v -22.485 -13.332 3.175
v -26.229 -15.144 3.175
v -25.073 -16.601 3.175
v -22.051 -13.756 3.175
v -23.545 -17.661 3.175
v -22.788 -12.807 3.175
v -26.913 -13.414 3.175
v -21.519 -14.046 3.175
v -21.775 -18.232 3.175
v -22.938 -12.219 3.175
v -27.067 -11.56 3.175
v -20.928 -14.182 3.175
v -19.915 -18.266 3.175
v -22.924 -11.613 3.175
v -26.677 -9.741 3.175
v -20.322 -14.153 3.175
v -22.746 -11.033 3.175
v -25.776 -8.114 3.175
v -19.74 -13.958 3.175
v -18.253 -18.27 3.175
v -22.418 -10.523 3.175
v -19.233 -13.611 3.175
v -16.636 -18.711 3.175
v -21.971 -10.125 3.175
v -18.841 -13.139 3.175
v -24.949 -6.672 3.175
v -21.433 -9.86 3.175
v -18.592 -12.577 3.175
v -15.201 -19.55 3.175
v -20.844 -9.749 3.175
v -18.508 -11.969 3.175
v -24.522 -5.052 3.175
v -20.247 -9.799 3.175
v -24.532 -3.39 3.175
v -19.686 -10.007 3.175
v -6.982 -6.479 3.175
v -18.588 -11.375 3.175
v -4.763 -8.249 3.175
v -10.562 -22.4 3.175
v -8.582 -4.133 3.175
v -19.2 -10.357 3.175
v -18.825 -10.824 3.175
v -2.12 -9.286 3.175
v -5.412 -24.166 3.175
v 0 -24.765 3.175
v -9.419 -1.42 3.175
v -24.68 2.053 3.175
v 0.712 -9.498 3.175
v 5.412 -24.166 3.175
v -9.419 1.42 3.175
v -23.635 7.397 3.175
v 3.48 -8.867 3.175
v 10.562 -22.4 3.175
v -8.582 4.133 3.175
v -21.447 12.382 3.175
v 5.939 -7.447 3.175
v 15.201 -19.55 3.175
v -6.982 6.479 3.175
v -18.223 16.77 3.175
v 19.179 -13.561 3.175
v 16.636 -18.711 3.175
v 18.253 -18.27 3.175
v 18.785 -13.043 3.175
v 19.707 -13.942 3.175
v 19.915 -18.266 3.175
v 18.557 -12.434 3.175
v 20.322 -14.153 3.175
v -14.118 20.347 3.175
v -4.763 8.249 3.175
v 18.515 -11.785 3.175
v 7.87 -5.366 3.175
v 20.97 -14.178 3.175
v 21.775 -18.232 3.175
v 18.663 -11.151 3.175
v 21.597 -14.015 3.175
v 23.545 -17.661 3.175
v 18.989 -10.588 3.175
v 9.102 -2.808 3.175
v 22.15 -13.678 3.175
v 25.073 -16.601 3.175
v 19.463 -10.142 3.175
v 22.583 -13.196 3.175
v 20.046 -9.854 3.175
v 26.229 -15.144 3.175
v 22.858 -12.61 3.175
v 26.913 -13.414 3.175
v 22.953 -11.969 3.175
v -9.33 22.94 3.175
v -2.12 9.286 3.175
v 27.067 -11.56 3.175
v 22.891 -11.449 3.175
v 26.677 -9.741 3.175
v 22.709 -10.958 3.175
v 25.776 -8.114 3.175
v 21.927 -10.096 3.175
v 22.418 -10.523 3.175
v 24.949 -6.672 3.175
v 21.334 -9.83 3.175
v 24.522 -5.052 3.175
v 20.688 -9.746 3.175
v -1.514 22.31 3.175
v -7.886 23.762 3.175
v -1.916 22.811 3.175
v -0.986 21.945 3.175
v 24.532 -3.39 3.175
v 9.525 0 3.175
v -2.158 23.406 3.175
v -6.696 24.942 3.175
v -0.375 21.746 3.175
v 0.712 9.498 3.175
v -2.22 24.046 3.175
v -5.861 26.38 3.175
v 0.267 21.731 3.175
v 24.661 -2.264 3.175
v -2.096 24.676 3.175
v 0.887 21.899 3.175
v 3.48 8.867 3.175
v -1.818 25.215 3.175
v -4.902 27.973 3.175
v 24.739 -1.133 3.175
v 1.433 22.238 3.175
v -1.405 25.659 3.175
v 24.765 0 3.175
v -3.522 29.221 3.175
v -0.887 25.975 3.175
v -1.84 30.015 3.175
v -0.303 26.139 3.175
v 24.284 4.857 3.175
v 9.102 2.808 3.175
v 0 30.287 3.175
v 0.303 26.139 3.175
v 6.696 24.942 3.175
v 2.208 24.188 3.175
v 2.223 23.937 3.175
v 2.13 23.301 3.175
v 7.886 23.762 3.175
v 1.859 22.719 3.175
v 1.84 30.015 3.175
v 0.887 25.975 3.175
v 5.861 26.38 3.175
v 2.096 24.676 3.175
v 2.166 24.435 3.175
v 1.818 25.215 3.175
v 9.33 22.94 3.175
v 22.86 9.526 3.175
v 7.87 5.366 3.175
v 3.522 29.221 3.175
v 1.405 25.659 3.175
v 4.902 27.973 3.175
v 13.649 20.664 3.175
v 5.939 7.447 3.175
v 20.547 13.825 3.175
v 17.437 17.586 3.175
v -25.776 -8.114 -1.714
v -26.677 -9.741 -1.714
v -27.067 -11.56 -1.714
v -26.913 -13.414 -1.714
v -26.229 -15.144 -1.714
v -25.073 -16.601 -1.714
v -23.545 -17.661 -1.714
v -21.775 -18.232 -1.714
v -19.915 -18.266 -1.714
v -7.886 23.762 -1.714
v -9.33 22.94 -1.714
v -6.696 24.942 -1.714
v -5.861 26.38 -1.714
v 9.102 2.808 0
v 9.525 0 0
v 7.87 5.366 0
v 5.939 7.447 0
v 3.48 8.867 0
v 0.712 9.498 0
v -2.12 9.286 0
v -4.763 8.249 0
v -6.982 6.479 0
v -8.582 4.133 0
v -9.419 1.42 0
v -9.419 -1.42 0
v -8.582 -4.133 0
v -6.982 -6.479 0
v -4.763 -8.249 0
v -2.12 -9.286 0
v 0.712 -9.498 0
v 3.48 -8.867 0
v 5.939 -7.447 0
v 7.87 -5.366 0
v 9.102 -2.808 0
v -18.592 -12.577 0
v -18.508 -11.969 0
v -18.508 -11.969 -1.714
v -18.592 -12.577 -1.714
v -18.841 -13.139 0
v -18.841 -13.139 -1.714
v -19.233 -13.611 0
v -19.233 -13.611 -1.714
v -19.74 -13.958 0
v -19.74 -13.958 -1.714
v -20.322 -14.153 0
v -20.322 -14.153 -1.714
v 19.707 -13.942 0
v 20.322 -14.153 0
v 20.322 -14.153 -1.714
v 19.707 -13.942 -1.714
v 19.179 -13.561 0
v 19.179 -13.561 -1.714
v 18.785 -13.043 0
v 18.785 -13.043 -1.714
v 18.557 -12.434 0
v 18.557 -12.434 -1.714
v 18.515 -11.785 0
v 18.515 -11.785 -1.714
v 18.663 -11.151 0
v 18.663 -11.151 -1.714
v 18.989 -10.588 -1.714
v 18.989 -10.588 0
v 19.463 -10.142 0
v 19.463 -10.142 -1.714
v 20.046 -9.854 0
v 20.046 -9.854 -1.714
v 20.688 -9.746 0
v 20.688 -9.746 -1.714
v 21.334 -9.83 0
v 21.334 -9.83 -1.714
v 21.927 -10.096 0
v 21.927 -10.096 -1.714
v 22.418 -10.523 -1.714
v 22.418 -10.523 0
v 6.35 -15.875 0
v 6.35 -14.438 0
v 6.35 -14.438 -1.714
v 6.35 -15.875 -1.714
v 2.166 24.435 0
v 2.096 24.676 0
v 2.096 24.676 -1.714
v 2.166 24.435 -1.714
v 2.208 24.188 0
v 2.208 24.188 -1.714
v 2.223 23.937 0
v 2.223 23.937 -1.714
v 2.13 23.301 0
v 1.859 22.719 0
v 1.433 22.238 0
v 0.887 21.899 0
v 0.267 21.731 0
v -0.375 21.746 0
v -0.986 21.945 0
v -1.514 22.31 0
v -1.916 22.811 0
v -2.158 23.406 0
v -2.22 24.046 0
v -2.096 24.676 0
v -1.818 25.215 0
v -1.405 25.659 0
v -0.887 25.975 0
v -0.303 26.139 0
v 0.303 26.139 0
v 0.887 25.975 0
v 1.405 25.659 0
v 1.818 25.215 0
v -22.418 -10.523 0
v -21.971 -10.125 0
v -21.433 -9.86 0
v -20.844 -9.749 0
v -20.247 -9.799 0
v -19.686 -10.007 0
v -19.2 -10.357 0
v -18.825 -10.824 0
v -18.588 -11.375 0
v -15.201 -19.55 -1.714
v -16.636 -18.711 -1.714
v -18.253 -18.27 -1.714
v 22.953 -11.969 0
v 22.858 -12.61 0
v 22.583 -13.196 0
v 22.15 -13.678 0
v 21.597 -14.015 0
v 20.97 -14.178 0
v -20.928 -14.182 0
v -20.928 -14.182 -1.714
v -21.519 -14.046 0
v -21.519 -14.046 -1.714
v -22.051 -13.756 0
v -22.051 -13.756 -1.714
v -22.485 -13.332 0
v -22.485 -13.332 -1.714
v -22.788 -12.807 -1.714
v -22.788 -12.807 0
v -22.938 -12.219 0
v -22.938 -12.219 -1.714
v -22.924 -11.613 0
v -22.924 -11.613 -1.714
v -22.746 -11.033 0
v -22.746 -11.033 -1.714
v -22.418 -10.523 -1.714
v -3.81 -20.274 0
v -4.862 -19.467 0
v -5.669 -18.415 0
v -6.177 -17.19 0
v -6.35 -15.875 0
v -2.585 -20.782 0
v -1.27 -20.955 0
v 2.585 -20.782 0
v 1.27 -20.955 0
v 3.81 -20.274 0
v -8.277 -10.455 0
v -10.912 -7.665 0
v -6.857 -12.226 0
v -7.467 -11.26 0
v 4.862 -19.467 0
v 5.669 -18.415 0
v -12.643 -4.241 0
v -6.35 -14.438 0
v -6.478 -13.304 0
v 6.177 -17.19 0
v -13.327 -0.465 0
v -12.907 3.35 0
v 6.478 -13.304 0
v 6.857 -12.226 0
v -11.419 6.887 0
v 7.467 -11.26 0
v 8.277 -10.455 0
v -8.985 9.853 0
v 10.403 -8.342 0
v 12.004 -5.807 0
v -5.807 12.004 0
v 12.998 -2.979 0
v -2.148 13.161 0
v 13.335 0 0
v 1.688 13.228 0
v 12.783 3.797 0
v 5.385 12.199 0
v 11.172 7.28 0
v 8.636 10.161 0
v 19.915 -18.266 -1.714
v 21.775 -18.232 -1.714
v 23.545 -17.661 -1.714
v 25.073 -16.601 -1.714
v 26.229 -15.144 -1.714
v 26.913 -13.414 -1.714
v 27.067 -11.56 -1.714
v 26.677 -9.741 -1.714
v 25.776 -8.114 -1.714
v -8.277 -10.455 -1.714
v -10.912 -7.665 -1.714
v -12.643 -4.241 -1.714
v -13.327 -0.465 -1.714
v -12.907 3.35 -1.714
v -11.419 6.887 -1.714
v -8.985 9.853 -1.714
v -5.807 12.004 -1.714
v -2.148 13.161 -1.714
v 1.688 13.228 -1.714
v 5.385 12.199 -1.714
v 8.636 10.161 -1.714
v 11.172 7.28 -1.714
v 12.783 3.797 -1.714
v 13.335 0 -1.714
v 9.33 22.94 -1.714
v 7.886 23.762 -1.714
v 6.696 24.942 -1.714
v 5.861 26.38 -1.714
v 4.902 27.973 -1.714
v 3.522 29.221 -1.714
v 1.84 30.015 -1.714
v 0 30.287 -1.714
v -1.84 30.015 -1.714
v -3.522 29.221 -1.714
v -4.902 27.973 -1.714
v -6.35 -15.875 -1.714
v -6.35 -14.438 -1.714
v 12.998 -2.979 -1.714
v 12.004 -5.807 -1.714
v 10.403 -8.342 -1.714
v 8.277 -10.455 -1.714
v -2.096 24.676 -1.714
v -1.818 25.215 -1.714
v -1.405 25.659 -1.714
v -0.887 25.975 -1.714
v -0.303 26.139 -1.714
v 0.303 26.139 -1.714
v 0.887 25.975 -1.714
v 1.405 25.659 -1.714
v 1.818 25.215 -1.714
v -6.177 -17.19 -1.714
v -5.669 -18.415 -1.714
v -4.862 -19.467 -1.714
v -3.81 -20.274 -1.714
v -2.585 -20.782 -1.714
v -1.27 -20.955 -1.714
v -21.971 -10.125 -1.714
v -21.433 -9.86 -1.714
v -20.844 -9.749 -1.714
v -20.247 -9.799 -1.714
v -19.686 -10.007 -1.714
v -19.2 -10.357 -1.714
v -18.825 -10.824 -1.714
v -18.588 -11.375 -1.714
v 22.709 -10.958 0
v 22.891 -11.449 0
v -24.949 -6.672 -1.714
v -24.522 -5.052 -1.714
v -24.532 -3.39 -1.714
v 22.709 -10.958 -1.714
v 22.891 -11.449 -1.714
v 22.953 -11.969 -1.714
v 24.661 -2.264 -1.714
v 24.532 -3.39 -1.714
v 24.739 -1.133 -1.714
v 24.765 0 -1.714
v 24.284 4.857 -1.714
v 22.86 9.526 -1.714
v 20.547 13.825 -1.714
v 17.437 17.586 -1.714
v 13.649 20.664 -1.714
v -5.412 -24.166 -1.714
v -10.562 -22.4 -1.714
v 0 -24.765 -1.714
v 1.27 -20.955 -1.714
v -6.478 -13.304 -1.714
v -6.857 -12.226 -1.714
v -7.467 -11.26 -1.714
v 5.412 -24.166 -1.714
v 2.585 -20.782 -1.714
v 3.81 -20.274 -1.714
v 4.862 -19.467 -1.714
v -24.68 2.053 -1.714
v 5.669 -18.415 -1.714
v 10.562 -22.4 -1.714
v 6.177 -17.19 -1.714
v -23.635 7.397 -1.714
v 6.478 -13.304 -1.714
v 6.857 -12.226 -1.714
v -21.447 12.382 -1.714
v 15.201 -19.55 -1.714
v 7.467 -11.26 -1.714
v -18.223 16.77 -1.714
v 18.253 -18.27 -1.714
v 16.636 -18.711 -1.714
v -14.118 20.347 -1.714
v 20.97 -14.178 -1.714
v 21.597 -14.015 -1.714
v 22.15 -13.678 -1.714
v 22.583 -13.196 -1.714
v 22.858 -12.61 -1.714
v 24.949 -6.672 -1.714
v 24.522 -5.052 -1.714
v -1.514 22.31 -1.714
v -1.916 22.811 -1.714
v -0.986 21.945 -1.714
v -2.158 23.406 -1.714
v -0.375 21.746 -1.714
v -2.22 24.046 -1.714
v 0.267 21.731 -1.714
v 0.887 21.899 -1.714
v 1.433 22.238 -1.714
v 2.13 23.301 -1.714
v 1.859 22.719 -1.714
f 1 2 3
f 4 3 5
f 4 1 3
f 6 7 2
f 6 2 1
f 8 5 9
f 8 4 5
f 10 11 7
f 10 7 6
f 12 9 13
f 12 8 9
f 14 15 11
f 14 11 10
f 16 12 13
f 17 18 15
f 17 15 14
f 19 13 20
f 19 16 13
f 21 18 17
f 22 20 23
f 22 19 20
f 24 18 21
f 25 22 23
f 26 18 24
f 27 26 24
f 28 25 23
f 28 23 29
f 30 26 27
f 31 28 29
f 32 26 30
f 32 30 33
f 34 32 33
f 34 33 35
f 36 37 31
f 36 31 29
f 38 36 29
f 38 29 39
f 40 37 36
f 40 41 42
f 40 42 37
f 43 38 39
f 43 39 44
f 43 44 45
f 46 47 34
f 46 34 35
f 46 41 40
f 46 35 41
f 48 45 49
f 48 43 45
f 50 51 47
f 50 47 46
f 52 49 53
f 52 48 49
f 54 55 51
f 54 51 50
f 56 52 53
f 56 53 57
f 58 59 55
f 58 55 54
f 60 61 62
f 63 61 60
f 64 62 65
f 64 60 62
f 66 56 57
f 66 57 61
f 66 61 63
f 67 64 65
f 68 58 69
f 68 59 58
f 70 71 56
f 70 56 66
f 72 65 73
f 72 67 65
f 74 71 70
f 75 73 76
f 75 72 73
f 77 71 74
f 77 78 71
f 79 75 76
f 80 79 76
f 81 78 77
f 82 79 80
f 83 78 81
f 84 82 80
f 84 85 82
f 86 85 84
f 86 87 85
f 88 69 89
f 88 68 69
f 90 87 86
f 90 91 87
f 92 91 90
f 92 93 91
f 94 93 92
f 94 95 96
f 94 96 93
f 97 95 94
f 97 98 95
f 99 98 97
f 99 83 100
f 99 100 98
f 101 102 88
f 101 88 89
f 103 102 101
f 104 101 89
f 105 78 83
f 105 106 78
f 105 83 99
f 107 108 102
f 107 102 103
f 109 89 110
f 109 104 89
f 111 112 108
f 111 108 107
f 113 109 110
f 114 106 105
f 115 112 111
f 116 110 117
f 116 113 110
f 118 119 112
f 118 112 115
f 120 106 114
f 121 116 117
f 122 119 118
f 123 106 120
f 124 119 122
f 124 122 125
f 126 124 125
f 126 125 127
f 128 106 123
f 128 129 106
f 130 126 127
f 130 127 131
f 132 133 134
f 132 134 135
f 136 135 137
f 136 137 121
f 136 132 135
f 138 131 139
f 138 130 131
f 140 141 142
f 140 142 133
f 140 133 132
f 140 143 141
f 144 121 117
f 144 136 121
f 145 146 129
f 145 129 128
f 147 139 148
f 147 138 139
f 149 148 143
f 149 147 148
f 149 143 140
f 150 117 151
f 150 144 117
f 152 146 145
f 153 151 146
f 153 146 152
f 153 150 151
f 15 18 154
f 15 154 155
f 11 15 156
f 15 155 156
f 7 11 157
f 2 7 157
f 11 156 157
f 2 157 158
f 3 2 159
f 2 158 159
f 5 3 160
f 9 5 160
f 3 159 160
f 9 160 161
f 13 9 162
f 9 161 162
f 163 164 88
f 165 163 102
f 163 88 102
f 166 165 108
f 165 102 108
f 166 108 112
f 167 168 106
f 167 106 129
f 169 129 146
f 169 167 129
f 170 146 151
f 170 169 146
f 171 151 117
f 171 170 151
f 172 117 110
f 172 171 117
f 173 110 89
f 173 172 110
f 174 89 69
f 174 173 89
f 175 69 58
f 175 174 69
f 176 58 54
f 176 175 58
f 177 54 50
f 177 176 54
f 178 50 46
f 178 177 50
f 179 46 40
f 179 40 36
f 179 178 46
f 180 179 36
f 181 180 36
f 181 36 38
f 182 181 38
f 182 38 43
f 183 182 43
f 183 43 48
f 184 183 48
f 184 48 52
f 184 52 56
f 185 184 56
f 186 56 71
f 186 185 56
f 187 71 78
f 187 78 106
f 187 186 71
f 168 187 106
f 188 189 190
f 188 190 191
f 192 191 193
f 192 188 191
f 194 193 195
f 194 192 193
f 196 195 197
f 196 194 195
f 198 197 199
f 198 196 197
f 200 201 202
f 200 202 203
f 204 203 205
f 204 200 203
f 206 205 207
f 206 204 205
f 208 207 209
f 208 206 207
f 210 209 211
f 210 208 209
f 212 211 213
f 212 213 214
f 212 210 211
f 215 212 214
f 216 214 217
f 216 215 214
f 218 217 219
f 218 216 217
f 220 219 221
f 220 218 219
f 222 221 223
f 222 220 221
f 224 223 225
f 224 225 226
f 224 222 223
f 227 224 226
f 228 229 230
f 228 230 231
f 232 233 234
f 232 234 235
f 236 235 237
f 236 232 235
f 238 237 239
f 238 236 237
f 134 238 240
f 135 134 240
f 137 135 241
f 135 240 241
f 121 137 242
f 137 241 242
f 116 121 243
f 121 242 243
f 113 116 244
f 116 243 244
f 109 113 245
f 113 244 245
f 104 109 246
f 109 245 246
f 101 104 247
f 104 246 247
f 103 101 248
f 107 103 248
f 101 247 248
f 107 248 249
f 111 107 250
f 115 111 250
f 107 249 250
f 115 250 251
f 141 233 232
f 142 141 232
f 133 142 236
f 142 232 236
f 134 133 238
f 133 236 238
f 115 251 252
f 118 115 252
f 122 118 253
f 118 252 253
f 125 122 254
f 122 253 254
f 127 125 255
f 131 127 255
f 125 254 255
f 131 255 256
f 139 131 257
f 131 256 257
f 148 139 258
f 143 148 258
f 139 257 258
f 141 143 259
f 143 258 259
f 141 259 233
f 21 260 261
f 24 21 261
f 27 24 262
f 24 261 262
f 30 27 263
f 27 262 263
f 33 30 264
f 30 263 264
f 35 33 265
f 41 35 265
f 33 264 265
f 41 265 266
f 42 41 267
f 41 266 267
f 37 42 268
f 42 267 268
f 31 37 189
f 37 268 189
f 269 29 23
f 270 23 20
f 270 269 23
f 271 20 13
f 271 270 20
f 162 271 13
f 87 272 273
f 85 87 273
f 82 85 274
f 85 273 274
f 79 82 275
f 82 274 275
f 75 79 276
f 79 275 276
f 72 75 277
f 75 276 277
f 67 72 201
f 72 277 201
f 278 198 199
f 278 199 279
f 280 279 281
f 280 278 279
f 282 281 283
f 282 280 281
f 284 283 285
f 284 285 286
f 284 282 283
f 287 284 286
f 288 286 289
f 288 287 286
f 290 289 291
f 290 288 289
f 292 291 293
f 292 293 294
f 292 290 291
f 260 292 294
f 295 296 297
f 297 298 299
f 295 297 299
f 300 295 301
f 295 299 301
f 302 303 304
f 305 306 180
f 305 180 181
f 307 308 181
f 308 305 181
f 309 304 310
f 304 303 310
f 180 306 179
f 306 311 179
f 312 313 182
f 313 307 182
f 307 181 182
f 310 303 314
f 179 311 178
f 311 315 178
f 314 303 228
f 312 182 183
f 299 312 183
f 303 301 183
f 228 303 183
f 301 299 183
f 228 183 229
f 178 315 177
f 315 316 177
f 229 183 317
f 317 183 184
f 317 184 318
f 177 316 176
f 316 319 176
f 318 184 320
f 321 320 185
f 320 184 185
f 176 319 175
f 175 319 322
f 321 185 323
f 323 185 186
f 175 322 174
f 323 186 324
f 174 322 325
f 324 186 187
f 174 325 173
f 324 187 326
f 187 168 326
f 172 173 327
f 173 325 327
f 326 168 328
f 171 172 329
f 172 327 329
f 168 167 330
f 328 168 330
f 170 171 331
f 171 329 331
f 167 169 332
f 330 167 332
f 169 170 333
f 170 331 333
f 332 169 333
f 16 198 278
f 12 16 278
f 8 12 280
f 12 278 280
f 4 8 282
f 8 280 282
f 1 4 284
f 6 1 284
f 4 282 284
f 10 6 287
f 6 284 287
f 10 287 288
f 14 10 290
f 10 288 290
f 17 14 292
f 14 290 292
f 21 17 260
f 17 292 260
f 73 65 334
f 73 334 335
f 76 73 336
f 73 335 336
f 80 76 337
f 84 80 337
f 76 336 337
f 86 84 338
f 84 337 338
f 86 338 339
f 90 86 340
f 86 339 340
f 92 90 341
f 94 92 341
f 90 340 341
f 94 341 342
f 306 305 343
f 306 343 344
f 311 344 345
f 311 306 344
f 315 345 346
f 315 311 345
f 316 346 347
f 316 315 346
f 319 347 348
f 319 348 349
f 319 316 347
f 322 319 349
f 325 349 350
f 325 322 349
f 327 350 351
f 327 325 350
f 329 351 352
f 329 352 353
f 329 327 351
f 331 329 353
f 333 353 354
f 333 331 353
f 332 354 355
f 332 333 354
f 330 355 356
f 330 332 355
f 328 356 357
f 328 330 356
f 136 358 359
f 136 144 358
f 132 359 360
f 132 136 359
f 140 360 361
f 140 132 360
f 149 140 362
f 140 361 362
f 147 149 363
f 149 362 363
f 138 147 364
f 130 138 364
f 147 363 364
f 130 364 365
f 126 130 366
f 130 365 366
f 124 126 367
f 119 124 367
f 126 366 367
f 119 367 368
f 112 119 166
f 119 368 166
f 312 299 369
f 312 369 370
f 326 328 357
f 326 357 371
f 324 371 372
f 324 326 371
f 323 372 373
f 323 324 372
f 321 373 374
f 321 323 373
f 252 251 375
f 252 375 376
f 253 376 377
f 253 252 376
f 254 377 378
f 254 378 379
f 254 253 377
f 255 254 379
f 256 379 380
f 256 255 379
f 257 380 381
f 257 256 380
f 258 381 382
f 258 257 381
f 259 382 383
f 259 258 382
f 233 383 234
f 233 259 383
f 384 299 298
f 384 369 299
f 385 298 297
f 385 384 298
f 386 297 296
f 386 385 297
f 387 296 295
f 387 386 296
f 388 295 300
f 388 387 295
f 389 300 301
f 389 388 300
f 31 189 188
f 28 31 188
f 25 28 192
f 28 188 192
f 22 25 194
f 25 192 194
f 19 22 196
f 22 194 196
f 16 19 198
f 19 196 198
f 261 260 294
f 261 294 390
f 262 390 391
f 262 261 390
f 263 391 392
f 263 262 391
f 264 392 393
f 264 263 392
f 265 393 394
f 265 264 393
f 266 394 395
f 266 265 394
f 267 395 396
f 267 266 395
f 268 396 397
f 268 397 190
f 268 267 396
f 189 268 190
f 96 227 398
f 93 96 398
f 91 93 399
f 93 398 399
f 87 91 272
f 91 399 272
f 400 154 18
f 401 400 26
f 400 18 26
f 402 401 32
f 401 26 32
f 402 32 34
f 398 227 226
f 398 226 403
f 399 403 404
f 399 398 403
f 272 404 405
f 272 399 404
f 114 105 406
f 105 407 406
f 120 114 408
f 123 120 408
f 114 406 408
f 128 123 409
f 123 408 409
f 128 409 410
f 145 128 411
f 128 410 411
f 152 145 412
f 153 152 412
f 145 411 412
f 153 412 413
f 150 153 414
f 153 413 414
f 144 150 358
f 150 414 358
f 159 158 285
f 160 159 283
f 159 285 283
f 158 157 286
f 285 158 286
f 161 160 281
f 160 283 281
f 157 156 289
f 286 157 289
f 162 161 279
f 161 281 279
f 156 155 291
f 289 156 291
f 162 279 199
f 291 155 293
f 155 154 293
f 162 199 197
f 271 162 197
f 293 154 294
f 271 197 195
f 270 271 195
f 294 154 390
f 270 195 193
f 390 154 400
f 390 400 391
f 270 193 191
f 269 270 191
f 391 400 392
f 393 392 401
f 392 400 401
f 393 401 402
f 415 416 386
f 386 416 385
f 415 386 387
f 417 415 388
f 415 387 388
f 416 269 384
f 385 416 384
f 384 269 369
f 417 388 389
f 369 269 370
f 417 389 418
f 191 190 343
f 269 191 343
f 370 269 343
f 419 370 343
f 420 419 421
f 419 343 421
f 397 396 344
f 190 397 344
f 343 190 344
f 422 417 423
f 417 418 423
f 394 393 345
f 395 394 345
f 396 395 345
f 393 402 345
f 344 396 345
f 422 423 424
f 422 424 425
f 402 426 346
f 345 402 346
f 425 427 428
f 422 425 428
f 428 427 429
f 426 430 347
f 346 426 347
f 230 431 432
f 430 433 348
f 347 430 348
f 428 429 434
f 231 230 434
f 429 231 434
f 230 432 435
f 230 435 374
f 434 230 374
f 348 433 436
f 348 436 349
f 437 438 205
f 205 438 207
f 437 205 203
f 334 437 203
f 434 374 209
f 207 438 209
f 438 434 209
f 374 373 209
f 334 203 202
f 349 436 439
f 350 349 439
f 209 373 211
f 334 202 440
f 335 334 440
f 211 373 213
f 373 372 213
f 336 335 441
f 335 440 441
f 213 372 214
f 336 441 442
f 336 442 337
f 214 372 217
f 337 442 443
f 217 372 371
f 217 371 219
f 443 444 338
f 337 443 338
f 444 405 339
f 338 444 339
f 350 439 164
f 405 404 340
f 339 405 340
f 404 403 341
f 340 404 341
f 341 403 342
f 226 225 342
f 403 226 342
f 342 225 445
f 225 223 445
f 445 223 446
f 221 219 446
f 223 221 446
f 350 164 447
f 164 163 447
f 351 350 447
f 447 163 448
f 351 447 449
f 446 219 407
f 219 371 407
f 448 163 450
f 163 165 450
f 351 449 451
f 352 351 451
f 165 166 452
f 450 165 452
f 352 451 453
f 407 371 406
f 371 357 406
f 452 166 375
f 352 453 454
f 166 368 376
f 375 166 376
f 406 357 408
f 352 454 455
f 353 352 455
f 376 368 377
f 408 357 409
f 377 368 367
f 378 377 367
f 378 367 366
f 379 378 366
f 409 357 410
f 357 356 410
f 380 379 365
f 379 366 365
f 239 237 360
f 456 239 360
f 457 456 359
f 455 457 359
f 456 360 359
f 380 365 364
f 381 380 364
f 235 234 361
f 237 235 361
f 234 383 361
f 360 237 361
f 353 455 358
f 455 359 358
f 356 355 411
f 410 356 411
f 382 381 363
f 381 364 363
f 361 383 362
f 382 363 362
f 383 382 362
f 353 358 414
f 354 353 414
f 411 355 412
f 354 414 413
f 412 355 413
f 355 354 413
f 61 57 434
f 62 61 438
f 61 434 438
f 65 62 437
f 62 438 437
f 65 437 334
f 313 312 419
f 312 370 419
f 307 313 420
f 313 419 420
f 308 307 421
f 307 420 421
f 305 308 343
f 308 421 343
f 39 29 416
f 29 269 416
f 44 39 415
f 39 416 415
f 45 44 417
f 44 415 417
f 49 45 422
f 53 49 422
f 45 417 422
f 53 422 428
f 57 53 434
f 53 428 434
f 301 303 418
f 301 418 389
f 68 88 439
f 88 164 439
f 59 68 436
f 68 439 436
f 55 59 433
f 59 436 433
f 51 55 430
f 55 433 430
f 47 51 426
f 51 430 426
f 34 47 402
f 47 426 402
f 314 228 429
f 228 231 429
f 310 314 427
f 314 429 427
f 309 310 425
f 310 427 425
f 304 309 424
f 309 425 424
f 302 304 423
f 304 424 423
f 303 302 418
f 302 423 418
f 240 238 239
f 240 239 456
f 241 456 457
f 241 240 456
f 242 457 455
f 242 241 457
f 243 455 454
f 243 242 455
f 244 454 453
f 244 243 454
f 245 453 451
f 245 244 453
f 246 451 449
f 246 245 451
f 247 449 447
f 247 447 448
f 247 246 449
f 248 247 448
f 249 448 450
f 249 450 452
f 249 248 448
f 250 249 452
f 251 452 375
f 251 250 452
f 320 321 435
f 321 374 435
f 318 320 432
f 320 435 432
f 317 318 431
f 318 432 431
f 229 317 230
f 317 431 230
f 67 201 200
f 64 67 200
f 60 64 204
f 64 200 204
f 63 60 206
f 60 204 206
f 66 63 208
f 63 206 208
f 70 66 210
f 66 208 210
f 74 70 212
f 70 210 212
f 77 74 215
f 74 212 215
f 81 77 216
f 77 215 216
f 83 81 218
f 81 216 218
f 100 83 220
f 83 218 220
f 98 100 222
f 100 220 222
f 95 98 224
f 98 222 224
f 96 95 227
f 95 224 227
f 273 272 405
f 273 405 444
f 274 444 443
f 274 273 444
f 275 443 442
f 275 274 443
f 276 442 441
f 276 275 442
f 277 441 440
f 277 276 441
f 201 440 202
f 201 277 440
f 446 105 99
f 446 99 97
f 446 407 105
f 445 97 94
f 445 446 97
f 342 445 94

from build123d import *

# Parameters (mm, degrees)
F1_DEPTH = 1.7145
F0_R     = 9.525
F2_DEPTH = 3.175
F3_R     = 6.35
F4_R     = 5.08


with BuildPart() as f1:
    # F0 (on Top) → F1 (new body)
    with BuildSketch(Plane.XY):
        with BuildLine():
            ThreePointArc((23.9050999455, -6.4692674698), (24.5490837421, -3.2630832697), (24.765, 0))
            ThreePointArc((24.765, 0), (19.6285885254, 15.1004548773), (6.35, 23.9370575677))
            ThreePointArc((6.35, 23.9370575677), (4.2391432725, 24.3994854314), (2.0960107473, 24.6761415936))
            ThreePointArc((2.0960107473, 24.6761415936), (2.1906494626, 24.3119724675), (2.2225, 23.9370575677))
            ThreePointArc((2.2225, 23.9370575677), (-0.3749148998, 21.7464081051), (-2.0960107473, 24.6761415936))
            ThreePointArc((-2.0960107473, 24.6761415936), (-4.2391432725, 24.3994854314), (-6.35, 23.9370575677))
            ThreePointArc((-6.35, 23.9370575677), (-21.4471191247, 12.3825), (-23.9050999455, -6.4692674698))
            ThreePointArc((-23.9050999455, -6.4692674698), (-23.2501458591, -8.5285369514), (-22.4181708611, -10.5228722431))
            ThreePointArc((-22.4181708611, -10.5228722431), (-19.9594610417, -9.8839132486), (-18.5075999455, -11.9685287839))
            ThreePointArc((-18.5075999455, -11.9685287839), (-19.02039931, -13.3885393426), (-20.3221601138, -14.1532693505))
            ThreePointArc((-20.3221601138, -14.1532693505), (-19.0110025866, -15.87094848), (-17.5550999455, -17.4677900979))
            ThreePointArc((-17.5550999455, -17.4677900979), (0, -24.765), (17.5550999455, -17.4677900979))
            ThreePointArc((17.5550999455, -17.4677900979), (19.0110025866, -15.87094848), (20.3221601138, -14.1532693505))
            ThreePointArc((20.3221601138, -14.1532693505), (18.8053584856, -10.8572787839), (22.4181708611, -10.5228722431))
            ThreePointArc((22.4181708611, -10.5228722431), (23.2501458591, -8.5285369514), (23.9050999455, -6.4692674698))
        make_face()
        with BuildLine():
            ThreePointArc((-6.35, -11.7260276735), (-6.8244038201, 11.4564277809), (13.335, 0))
            ThreePointArc((13.335, 0), (11.4564277809, -6.8244038201), (6.35, -11.7260276735))
            Line((6.35, -11.7260276735), (6.35, -20.955))
            Line((6.35, -20.955), (-6.35, -20.955))
            Line((-6.35, -20.955), (-6.35, -11.7260276735))
        make_face(mode=Mode.SUBTRACT)
        with BuildLine():
            ThreePointArc((2.0960107473, 24.6761415936), (4.2391432725, 24.3994854314), (6.35, 23.9370575677))
            ThreePointArc((6.35, 23.9370575677), (0, 30.2870575677), (-6.35, 23.9370575677))
            ThreePointArc((-6.35, 23.9370575677), (-4.2391432725, 24.3994854314), (-2.0960107473, 24.6761415936))
            ThreePointArc((-2.0960107473, 24.6761415936), (0, 26.1595575677), (2.0960107473, 24.6761415936))
        make_face()
        with BuildLine():
            ThreePointArc((17.5550999455, -17.4677900979), (26.2293612595, -15.1435287839), (23.9050999455, -6.4692674698))
            ThreePointArc((23.9050999455, -6.4692674698), (23.2501458591, -8.5285369514), (22.4181708611, -10.5228722431))
            ThreePointArc((22.4181708611, -10.5228722431), (22.8147154808, -11.1978898801), (22.9525999455, -11.9685287839))
            ThreePointArc((22.9525999455, -11.9685287839), (22.1501105043, -13.6782294193), (20.3221601138, -14.1532693505))
            ThreePointArc((20.3221601138, -14.1532693505), (19.0110025866, -15.87094848), (17.5550999455, -17.4677900979))
        make_face()
        with BuildLine():
            ThreePointArc((-22.4181708611, -10.5228722431), (-23.2501458591, -8.5285369514), (-23.9050999455, -6.4692674698))
            ThreePointArc((-23.9050999455, -6.4692674698), (-26.2293612595, -15.1435287839), (-17.5550999455, -17.4677900979))
            ThreePointArc((-17.5550999455, -17.4677900979), (-19.0110025866, -15.87094848), (-20.3221601138, -14.1532693505))
            ThreePointArc((-20.3221601138, -14.1532693505), (-22.6548414054, -13.0797787839), (-22.4181708611, -10.5228722431))
        make_face()
    extrude(amount=-F1_DEPTH)

    # F0 (on Top) → F2 (join)
    with BuildSketch(Plane.XY):
        with BuildLine():
            ThreePointArc((23.9050999455, -6.4692674698), (24.5490837421, -3.2630832697), (24.765, 0))
            ThreePointArc((24.765, 0), (19.6285885254, 15.1004548773), (6.35, 23.9370575677))
            ThreePointArc((6.35, 23.9370575677), (4.2391432725, 24.3994854314), (2.0960107473, 24.6761415936))
            ThreePointArc((2.0960107473, 24.6761415936), (2.1906494626, 24.3119724675), (2.2225, 23.9370575677))
            ThreePointArc((2.2225, 23.9370575677), (-0.3749148998, 21.7464081051), (-2.0960107473, 24.6761415936))
            ThreePointArc((-2.0960107473, 24.6761415936), (-4.2391432725, 24.3994854314), (-6.35, 23.9370575677))
            ThreePointArc((-6.35, 23.9370575677), (-21.4471191247, 12.3825), (-23.9050999455, -6.4692674698))
            ThreePointArc((-23.9050999455, -6.4692674698), (-23.2501458591, -8.5285369514), (-22.4181708611, -10.5228722431))
            ThreePointArc((-22.4181708611, -10.5228722431), (-19.9594610417, -9.8839132486), (-18.5075999455, -11.9685287839))
            ThreePointArc((-18.5075999455, -11.9685287839), (-19.02039931, -13.3885393426), (-20.3221601138, -14.1532693505))
            ThreePointArc((-20.3221601138, -14.1532693505), (-19.0110025866, -15.87094848), (-17.5550999455, -17.4677900979))
            ThreePointArc((-17.5550999455, -17.4677900979), (0, -24.765), (17.5550999455, -17.4677900979))
            ThreePointArc((17.5550999455, -17.4677900979), (19.0110025866, -15.87094848), (20.3221601138, -14.1532693505))
            ThreePointArc((20.3221601138, -14.1532693505), (18.8053584856, -10.8572787839), (22.4181708611, -10.5228722431))
            ThreePointArc((22.4181708611, -10.5228722431), (23.2501458591, -8.5285369514), (23.9050999455, -6.4692674698))
        make_face()
        with BuildLine():
            ThreePointArc((-6.35, -11.7260276735), (-6.8244038201, 11.4564277809), (13.335, 0))
            ThreePointArc((13.335, 0), (11.4564277809, -6.8244038201), (6.35, -11.7260276735))
            Line((6.35, -11.7260276735), (6.35, -20.955))
            Line((6.35, -20.955), (-6.35, -20.955))
            Line((-6.35, -20.955), (-6.35, -11.7260276735))
        make_face(mode=Mode.SUBTRACT)
        with BuildLine():
            ThreePointArc((6.35, -11.7260276735), (11.4564277809, -6.8244038201), (13.335, 0))
            ThreePointArc((13.335, 0), (-6.8244038201, 11.4564277809), (-6.35, -11.7260276735))
            ThreePointArc((-6.35, -11.7260276735), (0, -13.335), (6.35, -11.7260276735))
        make_face()
        Circle(F0_R, mode=Mode.SUBTRACT)
        with BuildLine():
            ThreePointArc((6.35, -11.7260276735), (0, -13.335), (-6.35, -11.7260276735))
            Line((-6.35, -11.7260276735), (-6.35, -20.955))
            Line((-6.35, -20.955), (6.35, -20.955))
            Line((6.35, -20.955), (6.35, -11.7260276735))
        make_face()
        with BuildLine():
            ThreePointArc((2.0960107473, 24.6761415936), (4.2391432725, 24.3994854314), (6.35, 23.9370575677))
            ThreePointArc((6.35, 23.9370575677), (0, 30.2870575677), (-6.35, 23.9370575677))
            ThreePointArc((-6.35, 23.9370575677), (-4.2391432725, 24.3994854314), (-2.0960107473, 24.6761415936))
            ThreePointArc((-2.0960107473, 24.6761415936), (0, 26.1595575677), (2.0960107473, 24.6761415936))
        make_face()
        with BuildLine():
            ThreePointArc((-22.4181708611, -10.5228722431), (-23.2501458591, -8.5285369514), (-23.9050999455, -6.4692674698))
            ThreePointArc((-23.9050999455, -6.4692674698), (-26.2293612595, -15.1435287839), (-17.5550999455, -17.4677900979))
            ThreePointArc((-17.5550999455, -17.4677900979), (-19.0110025866, -15.87094848), (-20.3221601138, -14.1532693505))
            ThreePointArc((-20.3221601138, -14.1532693505), (-22.6548414054, -13.0797787839), (-22.4181708611, -10.5228722431))
        make_face()
        with BuildLine():
            ThreePointArc((17.5550999455, -17.4677900979), (26.2293612595, -15.1435287839), (23.9050999455, -6.4692674698))
            ThreePointArc((23.9050999455, -6.4692674698), (23.2501458591, -8.5285369514), (22.4181708611, -10.5228722431))
            ThreePointArc((22.4181708611, -10.5228722431), (22.8147154808, -11.1978898801), (22.9525999455, -11.9685287839))
            ThreePointArc((22.9525999455, -11.9685287839), (22.1501105043, -13.6782294193), (20.3221601138, -14.1532693505))
            ThreePointArc((20.3221601138, -14.1532693505), (19.0110025866, -15.87094848), (17.5550999455, -17.4677900979))
        make_face()
    extrude(amount=F2_DEPTH)

    # F3
    f3_edges = [f1.edges().sort_by_distance(p)[0] for p in [
        (-23.9051, -6.469267, -0.85725),
        (6.35, 23.937058, 0.73025),
        (17.5551, -17.46779, 0.73025),
        (23.9051, -6.469267, 0.73025),
        (-17.5551, -17.46779, -0.85725),
        (-17.5551, -17.46779, 1.5875),
        (-23.9051, -6.469267, 1.5875),
        (-6.35, 23.937058, 1.5875),
        (-6.35, 23.937058, -0.85725),
    ]]
    fillet(f3_edges, radius=F3_R)

    # F4
    f4_edges = [f1.edges().sort_by_distance(p)[0] for p in [
        (-6.35, -11.726028, -0.85725),
        (6.35, -11.726028, -0.85725),
        (6.35, -20.955, -0.85725),
        (-6.35, -20.955, -0.85725),
    ]]
    fillet(f4_edges, radius=F4_R)


solid = f1.part
